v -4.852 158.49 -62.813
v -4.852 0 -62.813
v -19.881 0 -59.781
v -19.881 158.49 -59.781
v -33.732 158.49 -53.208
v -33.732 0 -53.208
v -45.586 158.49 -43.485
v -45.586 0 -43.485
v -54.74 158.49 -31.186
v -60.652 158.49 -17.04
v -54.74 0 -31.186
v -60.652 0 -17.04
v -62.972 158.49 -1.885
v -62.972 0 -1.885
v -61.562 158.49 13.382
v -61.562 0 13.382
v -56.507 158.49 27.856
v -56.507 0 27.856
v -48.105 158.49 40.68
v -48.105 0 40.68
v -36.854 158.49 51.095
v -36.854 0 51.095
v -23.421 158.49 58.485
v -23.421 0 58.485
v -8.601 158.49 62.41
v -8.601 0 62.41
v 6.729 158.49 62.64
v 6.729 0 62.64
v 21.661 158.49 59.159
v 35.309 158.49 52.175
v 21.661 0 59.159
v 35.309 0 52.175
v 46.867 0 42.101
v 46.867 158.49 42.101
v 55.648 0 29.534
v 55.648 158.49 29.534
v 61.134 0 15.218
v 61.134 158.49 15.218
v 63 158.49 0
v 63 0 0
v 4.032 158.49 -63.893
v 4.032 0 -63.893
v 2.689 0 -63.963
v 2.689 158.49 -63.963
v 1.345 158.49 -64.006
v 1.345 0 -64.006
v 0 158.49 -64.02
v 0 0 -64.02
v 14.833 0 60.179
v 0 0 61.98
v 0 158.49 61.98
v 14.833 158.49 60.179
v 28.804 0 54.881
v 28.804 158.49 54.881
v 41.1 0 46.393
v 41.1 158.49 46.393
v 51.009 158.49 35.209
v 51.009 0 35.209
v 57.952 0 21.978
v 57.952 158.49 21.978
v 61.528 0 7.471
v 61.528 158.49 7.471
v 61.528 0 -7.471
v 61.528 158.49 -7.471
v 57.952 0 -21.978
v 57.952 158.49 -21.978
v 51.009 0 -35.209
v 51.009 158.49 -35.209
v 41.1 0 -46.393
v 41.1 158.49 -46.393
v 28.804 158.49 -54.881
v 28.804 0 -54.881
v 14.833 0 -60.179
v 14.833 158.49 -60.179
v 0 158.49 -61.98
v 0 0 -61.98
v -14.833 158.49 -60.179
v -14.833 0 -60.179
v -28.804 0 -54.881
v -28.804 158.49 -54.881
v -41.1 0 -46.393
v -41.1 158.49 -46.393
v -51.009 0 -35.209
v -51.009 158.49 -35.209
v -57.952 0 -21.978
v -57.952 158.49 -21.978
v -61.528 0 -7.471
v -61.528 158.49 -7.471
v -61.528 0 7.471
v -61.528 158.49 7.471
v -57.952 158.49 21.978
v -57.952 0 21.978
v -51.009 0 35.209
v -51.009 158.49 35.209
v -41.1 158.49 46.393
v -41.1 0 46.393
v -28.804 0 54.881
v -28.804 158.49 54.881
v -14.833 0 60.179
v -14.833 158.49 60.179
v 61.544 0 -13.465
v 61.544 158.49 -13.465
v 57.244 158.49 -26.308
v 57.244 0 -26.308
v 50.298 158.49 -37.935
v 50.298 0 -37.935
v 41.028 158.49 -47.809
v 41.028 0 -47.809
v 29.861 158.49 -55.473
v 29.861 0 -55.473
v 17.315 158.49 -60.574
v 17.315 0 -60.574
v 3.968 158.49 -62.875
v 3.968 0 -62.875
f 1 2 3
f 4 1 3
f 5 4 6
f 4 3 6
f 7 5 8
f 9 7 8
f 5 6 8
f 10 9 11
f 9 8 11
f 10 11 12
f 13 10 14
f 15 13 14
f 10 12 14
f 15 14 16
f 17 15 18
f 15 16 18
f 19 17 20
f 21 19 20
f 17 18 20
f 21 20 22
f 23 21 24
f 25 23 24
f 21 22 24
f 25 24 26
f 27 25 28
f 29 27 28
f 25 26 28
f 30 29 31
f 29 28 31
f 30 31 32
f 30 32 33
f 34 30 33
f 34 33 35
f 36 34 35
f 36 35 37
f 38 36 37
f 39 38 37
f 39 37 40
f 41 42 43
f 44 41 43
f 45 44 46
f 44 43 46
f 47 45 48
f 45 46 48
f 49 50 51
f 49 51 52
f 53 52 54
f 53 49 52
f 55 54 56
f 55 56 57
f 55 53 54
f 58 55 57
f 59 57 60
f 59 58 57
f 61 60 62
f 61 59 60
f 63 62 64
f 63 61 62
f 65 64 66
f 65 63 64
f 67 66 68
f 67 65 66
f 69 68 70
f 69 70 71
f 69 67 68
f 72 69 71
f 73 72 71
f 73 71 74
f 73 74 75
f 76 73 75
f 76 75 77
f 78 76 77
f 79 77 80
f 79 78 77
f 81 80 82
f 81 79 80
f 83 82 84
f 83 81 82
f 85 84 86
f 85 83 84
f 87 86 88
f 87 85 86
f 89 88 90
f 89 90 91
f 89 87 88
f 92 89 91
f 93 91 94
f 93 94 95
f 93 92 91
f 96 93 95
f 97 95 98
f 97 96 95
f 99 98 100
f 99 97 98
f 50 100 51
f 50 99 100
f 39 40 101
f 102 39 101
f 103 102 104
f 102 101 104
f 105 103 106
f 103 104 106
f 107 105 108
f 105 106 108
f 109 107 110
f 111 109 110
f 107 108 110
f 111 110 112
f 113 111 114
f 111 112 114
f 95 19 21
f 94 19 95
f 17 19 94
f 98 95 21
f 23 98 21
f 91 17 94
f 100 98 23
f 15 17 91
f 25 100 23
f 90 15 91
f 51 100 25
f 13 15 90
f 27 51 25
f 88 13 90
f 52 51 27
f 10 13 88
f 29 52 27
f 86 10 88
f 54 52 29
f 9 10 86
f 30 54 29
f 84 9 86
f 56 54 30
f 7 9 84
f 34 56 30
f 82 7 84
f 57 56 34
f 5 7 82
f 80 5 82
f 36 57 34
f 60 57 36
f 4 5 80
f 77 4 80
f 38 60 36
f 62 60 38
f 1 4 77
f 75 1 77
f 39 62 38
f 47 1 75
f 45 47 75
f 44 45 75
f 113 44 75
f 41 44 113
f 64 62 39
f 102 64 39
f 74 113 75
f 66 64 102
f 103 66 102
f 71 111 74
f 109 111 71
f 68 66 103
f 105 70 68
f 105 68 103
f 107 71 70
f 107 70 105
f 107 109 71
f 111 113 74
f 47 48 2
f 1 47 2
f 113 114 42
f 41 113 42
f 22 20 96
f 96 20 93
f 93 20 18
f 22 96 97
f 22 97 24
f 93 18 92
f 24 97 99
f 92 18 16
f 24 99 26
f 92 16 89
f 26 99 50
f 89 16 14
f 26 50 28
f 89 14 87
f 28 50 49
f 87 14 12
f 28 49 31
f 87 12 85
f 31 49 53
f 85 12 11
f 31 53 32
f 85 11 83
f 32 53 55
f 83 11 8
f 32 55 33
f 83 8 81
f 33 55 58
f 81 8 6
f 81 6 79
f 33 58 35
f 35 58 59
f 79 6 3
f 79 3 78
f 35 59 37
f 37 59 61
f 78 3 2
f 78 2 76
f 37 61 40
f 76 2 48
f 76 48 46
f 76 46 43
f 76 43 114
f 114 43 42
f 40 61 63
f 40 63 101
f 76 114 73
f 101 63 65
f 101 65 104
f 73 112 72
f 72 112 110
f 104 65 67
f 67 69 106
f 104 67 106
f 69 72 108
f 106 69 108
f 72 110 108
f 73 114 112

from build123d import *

# Parameters (mm, degrees)
SKETCH1_R           = 63
SKETCH1_R_2         = 61.98
BOSS_EXTRUDE1_DEPTH = 158.49


with BuildPart() as part:
    # Sketch1 → Boss-Extrude1 (new body)
    # profile 1 of 3: a face of its own
    with BuildSketch(Plane(origin=(0, 0, 0), x_dir=(1, 0, 0), z_dir=(0, 1, 0))):
        with BuildLine():
            Line((0, 64.02), (0, 63))
            ThreePointArc((0, 63), (1.984924974, 62.968722973), (3.967879074, 62.874922947))
            Line((3.967879074, 62.874922947), (4.032120926, 63.89289789))
            ThreePointArc((4.032120926, 63.89289789), (2.017061855, 63.988216583), (0, 64.02))
        make_face()
    # profile 2 of 3: a face of its own
    with BuildSketch(Plane(origin=(0, 0, 0), x_dir=(1, 0, 0), z_dir=(0, 1, 0))):
        with BuildLine():
            ThreePointArc((-4.852097182, 62.812874102), (-2.427852094, 62.953201143), (0, 63))
            Line((0, 63), (0, 64.02))
            Line((0, 64.02), (-4.852097182, 62.812874102))
        make_face()
    # profile 3 of 3: a face of its own
    with BuildSketch(Plane(origin=(0, 0, 0), x_dir=(1, 0, 0), z_dir=(0, 1, 0))):
        Circle(SKETCH1_R)
        with Locations(Location((0, 0, 0), (0, 0, 270))):
            Circle(SKETCH1_R_2, mode=Mode.SUBTRACT)
    extrude(amount=BOSS_EXTRUDE1_DEPTH)


solid = part.part
